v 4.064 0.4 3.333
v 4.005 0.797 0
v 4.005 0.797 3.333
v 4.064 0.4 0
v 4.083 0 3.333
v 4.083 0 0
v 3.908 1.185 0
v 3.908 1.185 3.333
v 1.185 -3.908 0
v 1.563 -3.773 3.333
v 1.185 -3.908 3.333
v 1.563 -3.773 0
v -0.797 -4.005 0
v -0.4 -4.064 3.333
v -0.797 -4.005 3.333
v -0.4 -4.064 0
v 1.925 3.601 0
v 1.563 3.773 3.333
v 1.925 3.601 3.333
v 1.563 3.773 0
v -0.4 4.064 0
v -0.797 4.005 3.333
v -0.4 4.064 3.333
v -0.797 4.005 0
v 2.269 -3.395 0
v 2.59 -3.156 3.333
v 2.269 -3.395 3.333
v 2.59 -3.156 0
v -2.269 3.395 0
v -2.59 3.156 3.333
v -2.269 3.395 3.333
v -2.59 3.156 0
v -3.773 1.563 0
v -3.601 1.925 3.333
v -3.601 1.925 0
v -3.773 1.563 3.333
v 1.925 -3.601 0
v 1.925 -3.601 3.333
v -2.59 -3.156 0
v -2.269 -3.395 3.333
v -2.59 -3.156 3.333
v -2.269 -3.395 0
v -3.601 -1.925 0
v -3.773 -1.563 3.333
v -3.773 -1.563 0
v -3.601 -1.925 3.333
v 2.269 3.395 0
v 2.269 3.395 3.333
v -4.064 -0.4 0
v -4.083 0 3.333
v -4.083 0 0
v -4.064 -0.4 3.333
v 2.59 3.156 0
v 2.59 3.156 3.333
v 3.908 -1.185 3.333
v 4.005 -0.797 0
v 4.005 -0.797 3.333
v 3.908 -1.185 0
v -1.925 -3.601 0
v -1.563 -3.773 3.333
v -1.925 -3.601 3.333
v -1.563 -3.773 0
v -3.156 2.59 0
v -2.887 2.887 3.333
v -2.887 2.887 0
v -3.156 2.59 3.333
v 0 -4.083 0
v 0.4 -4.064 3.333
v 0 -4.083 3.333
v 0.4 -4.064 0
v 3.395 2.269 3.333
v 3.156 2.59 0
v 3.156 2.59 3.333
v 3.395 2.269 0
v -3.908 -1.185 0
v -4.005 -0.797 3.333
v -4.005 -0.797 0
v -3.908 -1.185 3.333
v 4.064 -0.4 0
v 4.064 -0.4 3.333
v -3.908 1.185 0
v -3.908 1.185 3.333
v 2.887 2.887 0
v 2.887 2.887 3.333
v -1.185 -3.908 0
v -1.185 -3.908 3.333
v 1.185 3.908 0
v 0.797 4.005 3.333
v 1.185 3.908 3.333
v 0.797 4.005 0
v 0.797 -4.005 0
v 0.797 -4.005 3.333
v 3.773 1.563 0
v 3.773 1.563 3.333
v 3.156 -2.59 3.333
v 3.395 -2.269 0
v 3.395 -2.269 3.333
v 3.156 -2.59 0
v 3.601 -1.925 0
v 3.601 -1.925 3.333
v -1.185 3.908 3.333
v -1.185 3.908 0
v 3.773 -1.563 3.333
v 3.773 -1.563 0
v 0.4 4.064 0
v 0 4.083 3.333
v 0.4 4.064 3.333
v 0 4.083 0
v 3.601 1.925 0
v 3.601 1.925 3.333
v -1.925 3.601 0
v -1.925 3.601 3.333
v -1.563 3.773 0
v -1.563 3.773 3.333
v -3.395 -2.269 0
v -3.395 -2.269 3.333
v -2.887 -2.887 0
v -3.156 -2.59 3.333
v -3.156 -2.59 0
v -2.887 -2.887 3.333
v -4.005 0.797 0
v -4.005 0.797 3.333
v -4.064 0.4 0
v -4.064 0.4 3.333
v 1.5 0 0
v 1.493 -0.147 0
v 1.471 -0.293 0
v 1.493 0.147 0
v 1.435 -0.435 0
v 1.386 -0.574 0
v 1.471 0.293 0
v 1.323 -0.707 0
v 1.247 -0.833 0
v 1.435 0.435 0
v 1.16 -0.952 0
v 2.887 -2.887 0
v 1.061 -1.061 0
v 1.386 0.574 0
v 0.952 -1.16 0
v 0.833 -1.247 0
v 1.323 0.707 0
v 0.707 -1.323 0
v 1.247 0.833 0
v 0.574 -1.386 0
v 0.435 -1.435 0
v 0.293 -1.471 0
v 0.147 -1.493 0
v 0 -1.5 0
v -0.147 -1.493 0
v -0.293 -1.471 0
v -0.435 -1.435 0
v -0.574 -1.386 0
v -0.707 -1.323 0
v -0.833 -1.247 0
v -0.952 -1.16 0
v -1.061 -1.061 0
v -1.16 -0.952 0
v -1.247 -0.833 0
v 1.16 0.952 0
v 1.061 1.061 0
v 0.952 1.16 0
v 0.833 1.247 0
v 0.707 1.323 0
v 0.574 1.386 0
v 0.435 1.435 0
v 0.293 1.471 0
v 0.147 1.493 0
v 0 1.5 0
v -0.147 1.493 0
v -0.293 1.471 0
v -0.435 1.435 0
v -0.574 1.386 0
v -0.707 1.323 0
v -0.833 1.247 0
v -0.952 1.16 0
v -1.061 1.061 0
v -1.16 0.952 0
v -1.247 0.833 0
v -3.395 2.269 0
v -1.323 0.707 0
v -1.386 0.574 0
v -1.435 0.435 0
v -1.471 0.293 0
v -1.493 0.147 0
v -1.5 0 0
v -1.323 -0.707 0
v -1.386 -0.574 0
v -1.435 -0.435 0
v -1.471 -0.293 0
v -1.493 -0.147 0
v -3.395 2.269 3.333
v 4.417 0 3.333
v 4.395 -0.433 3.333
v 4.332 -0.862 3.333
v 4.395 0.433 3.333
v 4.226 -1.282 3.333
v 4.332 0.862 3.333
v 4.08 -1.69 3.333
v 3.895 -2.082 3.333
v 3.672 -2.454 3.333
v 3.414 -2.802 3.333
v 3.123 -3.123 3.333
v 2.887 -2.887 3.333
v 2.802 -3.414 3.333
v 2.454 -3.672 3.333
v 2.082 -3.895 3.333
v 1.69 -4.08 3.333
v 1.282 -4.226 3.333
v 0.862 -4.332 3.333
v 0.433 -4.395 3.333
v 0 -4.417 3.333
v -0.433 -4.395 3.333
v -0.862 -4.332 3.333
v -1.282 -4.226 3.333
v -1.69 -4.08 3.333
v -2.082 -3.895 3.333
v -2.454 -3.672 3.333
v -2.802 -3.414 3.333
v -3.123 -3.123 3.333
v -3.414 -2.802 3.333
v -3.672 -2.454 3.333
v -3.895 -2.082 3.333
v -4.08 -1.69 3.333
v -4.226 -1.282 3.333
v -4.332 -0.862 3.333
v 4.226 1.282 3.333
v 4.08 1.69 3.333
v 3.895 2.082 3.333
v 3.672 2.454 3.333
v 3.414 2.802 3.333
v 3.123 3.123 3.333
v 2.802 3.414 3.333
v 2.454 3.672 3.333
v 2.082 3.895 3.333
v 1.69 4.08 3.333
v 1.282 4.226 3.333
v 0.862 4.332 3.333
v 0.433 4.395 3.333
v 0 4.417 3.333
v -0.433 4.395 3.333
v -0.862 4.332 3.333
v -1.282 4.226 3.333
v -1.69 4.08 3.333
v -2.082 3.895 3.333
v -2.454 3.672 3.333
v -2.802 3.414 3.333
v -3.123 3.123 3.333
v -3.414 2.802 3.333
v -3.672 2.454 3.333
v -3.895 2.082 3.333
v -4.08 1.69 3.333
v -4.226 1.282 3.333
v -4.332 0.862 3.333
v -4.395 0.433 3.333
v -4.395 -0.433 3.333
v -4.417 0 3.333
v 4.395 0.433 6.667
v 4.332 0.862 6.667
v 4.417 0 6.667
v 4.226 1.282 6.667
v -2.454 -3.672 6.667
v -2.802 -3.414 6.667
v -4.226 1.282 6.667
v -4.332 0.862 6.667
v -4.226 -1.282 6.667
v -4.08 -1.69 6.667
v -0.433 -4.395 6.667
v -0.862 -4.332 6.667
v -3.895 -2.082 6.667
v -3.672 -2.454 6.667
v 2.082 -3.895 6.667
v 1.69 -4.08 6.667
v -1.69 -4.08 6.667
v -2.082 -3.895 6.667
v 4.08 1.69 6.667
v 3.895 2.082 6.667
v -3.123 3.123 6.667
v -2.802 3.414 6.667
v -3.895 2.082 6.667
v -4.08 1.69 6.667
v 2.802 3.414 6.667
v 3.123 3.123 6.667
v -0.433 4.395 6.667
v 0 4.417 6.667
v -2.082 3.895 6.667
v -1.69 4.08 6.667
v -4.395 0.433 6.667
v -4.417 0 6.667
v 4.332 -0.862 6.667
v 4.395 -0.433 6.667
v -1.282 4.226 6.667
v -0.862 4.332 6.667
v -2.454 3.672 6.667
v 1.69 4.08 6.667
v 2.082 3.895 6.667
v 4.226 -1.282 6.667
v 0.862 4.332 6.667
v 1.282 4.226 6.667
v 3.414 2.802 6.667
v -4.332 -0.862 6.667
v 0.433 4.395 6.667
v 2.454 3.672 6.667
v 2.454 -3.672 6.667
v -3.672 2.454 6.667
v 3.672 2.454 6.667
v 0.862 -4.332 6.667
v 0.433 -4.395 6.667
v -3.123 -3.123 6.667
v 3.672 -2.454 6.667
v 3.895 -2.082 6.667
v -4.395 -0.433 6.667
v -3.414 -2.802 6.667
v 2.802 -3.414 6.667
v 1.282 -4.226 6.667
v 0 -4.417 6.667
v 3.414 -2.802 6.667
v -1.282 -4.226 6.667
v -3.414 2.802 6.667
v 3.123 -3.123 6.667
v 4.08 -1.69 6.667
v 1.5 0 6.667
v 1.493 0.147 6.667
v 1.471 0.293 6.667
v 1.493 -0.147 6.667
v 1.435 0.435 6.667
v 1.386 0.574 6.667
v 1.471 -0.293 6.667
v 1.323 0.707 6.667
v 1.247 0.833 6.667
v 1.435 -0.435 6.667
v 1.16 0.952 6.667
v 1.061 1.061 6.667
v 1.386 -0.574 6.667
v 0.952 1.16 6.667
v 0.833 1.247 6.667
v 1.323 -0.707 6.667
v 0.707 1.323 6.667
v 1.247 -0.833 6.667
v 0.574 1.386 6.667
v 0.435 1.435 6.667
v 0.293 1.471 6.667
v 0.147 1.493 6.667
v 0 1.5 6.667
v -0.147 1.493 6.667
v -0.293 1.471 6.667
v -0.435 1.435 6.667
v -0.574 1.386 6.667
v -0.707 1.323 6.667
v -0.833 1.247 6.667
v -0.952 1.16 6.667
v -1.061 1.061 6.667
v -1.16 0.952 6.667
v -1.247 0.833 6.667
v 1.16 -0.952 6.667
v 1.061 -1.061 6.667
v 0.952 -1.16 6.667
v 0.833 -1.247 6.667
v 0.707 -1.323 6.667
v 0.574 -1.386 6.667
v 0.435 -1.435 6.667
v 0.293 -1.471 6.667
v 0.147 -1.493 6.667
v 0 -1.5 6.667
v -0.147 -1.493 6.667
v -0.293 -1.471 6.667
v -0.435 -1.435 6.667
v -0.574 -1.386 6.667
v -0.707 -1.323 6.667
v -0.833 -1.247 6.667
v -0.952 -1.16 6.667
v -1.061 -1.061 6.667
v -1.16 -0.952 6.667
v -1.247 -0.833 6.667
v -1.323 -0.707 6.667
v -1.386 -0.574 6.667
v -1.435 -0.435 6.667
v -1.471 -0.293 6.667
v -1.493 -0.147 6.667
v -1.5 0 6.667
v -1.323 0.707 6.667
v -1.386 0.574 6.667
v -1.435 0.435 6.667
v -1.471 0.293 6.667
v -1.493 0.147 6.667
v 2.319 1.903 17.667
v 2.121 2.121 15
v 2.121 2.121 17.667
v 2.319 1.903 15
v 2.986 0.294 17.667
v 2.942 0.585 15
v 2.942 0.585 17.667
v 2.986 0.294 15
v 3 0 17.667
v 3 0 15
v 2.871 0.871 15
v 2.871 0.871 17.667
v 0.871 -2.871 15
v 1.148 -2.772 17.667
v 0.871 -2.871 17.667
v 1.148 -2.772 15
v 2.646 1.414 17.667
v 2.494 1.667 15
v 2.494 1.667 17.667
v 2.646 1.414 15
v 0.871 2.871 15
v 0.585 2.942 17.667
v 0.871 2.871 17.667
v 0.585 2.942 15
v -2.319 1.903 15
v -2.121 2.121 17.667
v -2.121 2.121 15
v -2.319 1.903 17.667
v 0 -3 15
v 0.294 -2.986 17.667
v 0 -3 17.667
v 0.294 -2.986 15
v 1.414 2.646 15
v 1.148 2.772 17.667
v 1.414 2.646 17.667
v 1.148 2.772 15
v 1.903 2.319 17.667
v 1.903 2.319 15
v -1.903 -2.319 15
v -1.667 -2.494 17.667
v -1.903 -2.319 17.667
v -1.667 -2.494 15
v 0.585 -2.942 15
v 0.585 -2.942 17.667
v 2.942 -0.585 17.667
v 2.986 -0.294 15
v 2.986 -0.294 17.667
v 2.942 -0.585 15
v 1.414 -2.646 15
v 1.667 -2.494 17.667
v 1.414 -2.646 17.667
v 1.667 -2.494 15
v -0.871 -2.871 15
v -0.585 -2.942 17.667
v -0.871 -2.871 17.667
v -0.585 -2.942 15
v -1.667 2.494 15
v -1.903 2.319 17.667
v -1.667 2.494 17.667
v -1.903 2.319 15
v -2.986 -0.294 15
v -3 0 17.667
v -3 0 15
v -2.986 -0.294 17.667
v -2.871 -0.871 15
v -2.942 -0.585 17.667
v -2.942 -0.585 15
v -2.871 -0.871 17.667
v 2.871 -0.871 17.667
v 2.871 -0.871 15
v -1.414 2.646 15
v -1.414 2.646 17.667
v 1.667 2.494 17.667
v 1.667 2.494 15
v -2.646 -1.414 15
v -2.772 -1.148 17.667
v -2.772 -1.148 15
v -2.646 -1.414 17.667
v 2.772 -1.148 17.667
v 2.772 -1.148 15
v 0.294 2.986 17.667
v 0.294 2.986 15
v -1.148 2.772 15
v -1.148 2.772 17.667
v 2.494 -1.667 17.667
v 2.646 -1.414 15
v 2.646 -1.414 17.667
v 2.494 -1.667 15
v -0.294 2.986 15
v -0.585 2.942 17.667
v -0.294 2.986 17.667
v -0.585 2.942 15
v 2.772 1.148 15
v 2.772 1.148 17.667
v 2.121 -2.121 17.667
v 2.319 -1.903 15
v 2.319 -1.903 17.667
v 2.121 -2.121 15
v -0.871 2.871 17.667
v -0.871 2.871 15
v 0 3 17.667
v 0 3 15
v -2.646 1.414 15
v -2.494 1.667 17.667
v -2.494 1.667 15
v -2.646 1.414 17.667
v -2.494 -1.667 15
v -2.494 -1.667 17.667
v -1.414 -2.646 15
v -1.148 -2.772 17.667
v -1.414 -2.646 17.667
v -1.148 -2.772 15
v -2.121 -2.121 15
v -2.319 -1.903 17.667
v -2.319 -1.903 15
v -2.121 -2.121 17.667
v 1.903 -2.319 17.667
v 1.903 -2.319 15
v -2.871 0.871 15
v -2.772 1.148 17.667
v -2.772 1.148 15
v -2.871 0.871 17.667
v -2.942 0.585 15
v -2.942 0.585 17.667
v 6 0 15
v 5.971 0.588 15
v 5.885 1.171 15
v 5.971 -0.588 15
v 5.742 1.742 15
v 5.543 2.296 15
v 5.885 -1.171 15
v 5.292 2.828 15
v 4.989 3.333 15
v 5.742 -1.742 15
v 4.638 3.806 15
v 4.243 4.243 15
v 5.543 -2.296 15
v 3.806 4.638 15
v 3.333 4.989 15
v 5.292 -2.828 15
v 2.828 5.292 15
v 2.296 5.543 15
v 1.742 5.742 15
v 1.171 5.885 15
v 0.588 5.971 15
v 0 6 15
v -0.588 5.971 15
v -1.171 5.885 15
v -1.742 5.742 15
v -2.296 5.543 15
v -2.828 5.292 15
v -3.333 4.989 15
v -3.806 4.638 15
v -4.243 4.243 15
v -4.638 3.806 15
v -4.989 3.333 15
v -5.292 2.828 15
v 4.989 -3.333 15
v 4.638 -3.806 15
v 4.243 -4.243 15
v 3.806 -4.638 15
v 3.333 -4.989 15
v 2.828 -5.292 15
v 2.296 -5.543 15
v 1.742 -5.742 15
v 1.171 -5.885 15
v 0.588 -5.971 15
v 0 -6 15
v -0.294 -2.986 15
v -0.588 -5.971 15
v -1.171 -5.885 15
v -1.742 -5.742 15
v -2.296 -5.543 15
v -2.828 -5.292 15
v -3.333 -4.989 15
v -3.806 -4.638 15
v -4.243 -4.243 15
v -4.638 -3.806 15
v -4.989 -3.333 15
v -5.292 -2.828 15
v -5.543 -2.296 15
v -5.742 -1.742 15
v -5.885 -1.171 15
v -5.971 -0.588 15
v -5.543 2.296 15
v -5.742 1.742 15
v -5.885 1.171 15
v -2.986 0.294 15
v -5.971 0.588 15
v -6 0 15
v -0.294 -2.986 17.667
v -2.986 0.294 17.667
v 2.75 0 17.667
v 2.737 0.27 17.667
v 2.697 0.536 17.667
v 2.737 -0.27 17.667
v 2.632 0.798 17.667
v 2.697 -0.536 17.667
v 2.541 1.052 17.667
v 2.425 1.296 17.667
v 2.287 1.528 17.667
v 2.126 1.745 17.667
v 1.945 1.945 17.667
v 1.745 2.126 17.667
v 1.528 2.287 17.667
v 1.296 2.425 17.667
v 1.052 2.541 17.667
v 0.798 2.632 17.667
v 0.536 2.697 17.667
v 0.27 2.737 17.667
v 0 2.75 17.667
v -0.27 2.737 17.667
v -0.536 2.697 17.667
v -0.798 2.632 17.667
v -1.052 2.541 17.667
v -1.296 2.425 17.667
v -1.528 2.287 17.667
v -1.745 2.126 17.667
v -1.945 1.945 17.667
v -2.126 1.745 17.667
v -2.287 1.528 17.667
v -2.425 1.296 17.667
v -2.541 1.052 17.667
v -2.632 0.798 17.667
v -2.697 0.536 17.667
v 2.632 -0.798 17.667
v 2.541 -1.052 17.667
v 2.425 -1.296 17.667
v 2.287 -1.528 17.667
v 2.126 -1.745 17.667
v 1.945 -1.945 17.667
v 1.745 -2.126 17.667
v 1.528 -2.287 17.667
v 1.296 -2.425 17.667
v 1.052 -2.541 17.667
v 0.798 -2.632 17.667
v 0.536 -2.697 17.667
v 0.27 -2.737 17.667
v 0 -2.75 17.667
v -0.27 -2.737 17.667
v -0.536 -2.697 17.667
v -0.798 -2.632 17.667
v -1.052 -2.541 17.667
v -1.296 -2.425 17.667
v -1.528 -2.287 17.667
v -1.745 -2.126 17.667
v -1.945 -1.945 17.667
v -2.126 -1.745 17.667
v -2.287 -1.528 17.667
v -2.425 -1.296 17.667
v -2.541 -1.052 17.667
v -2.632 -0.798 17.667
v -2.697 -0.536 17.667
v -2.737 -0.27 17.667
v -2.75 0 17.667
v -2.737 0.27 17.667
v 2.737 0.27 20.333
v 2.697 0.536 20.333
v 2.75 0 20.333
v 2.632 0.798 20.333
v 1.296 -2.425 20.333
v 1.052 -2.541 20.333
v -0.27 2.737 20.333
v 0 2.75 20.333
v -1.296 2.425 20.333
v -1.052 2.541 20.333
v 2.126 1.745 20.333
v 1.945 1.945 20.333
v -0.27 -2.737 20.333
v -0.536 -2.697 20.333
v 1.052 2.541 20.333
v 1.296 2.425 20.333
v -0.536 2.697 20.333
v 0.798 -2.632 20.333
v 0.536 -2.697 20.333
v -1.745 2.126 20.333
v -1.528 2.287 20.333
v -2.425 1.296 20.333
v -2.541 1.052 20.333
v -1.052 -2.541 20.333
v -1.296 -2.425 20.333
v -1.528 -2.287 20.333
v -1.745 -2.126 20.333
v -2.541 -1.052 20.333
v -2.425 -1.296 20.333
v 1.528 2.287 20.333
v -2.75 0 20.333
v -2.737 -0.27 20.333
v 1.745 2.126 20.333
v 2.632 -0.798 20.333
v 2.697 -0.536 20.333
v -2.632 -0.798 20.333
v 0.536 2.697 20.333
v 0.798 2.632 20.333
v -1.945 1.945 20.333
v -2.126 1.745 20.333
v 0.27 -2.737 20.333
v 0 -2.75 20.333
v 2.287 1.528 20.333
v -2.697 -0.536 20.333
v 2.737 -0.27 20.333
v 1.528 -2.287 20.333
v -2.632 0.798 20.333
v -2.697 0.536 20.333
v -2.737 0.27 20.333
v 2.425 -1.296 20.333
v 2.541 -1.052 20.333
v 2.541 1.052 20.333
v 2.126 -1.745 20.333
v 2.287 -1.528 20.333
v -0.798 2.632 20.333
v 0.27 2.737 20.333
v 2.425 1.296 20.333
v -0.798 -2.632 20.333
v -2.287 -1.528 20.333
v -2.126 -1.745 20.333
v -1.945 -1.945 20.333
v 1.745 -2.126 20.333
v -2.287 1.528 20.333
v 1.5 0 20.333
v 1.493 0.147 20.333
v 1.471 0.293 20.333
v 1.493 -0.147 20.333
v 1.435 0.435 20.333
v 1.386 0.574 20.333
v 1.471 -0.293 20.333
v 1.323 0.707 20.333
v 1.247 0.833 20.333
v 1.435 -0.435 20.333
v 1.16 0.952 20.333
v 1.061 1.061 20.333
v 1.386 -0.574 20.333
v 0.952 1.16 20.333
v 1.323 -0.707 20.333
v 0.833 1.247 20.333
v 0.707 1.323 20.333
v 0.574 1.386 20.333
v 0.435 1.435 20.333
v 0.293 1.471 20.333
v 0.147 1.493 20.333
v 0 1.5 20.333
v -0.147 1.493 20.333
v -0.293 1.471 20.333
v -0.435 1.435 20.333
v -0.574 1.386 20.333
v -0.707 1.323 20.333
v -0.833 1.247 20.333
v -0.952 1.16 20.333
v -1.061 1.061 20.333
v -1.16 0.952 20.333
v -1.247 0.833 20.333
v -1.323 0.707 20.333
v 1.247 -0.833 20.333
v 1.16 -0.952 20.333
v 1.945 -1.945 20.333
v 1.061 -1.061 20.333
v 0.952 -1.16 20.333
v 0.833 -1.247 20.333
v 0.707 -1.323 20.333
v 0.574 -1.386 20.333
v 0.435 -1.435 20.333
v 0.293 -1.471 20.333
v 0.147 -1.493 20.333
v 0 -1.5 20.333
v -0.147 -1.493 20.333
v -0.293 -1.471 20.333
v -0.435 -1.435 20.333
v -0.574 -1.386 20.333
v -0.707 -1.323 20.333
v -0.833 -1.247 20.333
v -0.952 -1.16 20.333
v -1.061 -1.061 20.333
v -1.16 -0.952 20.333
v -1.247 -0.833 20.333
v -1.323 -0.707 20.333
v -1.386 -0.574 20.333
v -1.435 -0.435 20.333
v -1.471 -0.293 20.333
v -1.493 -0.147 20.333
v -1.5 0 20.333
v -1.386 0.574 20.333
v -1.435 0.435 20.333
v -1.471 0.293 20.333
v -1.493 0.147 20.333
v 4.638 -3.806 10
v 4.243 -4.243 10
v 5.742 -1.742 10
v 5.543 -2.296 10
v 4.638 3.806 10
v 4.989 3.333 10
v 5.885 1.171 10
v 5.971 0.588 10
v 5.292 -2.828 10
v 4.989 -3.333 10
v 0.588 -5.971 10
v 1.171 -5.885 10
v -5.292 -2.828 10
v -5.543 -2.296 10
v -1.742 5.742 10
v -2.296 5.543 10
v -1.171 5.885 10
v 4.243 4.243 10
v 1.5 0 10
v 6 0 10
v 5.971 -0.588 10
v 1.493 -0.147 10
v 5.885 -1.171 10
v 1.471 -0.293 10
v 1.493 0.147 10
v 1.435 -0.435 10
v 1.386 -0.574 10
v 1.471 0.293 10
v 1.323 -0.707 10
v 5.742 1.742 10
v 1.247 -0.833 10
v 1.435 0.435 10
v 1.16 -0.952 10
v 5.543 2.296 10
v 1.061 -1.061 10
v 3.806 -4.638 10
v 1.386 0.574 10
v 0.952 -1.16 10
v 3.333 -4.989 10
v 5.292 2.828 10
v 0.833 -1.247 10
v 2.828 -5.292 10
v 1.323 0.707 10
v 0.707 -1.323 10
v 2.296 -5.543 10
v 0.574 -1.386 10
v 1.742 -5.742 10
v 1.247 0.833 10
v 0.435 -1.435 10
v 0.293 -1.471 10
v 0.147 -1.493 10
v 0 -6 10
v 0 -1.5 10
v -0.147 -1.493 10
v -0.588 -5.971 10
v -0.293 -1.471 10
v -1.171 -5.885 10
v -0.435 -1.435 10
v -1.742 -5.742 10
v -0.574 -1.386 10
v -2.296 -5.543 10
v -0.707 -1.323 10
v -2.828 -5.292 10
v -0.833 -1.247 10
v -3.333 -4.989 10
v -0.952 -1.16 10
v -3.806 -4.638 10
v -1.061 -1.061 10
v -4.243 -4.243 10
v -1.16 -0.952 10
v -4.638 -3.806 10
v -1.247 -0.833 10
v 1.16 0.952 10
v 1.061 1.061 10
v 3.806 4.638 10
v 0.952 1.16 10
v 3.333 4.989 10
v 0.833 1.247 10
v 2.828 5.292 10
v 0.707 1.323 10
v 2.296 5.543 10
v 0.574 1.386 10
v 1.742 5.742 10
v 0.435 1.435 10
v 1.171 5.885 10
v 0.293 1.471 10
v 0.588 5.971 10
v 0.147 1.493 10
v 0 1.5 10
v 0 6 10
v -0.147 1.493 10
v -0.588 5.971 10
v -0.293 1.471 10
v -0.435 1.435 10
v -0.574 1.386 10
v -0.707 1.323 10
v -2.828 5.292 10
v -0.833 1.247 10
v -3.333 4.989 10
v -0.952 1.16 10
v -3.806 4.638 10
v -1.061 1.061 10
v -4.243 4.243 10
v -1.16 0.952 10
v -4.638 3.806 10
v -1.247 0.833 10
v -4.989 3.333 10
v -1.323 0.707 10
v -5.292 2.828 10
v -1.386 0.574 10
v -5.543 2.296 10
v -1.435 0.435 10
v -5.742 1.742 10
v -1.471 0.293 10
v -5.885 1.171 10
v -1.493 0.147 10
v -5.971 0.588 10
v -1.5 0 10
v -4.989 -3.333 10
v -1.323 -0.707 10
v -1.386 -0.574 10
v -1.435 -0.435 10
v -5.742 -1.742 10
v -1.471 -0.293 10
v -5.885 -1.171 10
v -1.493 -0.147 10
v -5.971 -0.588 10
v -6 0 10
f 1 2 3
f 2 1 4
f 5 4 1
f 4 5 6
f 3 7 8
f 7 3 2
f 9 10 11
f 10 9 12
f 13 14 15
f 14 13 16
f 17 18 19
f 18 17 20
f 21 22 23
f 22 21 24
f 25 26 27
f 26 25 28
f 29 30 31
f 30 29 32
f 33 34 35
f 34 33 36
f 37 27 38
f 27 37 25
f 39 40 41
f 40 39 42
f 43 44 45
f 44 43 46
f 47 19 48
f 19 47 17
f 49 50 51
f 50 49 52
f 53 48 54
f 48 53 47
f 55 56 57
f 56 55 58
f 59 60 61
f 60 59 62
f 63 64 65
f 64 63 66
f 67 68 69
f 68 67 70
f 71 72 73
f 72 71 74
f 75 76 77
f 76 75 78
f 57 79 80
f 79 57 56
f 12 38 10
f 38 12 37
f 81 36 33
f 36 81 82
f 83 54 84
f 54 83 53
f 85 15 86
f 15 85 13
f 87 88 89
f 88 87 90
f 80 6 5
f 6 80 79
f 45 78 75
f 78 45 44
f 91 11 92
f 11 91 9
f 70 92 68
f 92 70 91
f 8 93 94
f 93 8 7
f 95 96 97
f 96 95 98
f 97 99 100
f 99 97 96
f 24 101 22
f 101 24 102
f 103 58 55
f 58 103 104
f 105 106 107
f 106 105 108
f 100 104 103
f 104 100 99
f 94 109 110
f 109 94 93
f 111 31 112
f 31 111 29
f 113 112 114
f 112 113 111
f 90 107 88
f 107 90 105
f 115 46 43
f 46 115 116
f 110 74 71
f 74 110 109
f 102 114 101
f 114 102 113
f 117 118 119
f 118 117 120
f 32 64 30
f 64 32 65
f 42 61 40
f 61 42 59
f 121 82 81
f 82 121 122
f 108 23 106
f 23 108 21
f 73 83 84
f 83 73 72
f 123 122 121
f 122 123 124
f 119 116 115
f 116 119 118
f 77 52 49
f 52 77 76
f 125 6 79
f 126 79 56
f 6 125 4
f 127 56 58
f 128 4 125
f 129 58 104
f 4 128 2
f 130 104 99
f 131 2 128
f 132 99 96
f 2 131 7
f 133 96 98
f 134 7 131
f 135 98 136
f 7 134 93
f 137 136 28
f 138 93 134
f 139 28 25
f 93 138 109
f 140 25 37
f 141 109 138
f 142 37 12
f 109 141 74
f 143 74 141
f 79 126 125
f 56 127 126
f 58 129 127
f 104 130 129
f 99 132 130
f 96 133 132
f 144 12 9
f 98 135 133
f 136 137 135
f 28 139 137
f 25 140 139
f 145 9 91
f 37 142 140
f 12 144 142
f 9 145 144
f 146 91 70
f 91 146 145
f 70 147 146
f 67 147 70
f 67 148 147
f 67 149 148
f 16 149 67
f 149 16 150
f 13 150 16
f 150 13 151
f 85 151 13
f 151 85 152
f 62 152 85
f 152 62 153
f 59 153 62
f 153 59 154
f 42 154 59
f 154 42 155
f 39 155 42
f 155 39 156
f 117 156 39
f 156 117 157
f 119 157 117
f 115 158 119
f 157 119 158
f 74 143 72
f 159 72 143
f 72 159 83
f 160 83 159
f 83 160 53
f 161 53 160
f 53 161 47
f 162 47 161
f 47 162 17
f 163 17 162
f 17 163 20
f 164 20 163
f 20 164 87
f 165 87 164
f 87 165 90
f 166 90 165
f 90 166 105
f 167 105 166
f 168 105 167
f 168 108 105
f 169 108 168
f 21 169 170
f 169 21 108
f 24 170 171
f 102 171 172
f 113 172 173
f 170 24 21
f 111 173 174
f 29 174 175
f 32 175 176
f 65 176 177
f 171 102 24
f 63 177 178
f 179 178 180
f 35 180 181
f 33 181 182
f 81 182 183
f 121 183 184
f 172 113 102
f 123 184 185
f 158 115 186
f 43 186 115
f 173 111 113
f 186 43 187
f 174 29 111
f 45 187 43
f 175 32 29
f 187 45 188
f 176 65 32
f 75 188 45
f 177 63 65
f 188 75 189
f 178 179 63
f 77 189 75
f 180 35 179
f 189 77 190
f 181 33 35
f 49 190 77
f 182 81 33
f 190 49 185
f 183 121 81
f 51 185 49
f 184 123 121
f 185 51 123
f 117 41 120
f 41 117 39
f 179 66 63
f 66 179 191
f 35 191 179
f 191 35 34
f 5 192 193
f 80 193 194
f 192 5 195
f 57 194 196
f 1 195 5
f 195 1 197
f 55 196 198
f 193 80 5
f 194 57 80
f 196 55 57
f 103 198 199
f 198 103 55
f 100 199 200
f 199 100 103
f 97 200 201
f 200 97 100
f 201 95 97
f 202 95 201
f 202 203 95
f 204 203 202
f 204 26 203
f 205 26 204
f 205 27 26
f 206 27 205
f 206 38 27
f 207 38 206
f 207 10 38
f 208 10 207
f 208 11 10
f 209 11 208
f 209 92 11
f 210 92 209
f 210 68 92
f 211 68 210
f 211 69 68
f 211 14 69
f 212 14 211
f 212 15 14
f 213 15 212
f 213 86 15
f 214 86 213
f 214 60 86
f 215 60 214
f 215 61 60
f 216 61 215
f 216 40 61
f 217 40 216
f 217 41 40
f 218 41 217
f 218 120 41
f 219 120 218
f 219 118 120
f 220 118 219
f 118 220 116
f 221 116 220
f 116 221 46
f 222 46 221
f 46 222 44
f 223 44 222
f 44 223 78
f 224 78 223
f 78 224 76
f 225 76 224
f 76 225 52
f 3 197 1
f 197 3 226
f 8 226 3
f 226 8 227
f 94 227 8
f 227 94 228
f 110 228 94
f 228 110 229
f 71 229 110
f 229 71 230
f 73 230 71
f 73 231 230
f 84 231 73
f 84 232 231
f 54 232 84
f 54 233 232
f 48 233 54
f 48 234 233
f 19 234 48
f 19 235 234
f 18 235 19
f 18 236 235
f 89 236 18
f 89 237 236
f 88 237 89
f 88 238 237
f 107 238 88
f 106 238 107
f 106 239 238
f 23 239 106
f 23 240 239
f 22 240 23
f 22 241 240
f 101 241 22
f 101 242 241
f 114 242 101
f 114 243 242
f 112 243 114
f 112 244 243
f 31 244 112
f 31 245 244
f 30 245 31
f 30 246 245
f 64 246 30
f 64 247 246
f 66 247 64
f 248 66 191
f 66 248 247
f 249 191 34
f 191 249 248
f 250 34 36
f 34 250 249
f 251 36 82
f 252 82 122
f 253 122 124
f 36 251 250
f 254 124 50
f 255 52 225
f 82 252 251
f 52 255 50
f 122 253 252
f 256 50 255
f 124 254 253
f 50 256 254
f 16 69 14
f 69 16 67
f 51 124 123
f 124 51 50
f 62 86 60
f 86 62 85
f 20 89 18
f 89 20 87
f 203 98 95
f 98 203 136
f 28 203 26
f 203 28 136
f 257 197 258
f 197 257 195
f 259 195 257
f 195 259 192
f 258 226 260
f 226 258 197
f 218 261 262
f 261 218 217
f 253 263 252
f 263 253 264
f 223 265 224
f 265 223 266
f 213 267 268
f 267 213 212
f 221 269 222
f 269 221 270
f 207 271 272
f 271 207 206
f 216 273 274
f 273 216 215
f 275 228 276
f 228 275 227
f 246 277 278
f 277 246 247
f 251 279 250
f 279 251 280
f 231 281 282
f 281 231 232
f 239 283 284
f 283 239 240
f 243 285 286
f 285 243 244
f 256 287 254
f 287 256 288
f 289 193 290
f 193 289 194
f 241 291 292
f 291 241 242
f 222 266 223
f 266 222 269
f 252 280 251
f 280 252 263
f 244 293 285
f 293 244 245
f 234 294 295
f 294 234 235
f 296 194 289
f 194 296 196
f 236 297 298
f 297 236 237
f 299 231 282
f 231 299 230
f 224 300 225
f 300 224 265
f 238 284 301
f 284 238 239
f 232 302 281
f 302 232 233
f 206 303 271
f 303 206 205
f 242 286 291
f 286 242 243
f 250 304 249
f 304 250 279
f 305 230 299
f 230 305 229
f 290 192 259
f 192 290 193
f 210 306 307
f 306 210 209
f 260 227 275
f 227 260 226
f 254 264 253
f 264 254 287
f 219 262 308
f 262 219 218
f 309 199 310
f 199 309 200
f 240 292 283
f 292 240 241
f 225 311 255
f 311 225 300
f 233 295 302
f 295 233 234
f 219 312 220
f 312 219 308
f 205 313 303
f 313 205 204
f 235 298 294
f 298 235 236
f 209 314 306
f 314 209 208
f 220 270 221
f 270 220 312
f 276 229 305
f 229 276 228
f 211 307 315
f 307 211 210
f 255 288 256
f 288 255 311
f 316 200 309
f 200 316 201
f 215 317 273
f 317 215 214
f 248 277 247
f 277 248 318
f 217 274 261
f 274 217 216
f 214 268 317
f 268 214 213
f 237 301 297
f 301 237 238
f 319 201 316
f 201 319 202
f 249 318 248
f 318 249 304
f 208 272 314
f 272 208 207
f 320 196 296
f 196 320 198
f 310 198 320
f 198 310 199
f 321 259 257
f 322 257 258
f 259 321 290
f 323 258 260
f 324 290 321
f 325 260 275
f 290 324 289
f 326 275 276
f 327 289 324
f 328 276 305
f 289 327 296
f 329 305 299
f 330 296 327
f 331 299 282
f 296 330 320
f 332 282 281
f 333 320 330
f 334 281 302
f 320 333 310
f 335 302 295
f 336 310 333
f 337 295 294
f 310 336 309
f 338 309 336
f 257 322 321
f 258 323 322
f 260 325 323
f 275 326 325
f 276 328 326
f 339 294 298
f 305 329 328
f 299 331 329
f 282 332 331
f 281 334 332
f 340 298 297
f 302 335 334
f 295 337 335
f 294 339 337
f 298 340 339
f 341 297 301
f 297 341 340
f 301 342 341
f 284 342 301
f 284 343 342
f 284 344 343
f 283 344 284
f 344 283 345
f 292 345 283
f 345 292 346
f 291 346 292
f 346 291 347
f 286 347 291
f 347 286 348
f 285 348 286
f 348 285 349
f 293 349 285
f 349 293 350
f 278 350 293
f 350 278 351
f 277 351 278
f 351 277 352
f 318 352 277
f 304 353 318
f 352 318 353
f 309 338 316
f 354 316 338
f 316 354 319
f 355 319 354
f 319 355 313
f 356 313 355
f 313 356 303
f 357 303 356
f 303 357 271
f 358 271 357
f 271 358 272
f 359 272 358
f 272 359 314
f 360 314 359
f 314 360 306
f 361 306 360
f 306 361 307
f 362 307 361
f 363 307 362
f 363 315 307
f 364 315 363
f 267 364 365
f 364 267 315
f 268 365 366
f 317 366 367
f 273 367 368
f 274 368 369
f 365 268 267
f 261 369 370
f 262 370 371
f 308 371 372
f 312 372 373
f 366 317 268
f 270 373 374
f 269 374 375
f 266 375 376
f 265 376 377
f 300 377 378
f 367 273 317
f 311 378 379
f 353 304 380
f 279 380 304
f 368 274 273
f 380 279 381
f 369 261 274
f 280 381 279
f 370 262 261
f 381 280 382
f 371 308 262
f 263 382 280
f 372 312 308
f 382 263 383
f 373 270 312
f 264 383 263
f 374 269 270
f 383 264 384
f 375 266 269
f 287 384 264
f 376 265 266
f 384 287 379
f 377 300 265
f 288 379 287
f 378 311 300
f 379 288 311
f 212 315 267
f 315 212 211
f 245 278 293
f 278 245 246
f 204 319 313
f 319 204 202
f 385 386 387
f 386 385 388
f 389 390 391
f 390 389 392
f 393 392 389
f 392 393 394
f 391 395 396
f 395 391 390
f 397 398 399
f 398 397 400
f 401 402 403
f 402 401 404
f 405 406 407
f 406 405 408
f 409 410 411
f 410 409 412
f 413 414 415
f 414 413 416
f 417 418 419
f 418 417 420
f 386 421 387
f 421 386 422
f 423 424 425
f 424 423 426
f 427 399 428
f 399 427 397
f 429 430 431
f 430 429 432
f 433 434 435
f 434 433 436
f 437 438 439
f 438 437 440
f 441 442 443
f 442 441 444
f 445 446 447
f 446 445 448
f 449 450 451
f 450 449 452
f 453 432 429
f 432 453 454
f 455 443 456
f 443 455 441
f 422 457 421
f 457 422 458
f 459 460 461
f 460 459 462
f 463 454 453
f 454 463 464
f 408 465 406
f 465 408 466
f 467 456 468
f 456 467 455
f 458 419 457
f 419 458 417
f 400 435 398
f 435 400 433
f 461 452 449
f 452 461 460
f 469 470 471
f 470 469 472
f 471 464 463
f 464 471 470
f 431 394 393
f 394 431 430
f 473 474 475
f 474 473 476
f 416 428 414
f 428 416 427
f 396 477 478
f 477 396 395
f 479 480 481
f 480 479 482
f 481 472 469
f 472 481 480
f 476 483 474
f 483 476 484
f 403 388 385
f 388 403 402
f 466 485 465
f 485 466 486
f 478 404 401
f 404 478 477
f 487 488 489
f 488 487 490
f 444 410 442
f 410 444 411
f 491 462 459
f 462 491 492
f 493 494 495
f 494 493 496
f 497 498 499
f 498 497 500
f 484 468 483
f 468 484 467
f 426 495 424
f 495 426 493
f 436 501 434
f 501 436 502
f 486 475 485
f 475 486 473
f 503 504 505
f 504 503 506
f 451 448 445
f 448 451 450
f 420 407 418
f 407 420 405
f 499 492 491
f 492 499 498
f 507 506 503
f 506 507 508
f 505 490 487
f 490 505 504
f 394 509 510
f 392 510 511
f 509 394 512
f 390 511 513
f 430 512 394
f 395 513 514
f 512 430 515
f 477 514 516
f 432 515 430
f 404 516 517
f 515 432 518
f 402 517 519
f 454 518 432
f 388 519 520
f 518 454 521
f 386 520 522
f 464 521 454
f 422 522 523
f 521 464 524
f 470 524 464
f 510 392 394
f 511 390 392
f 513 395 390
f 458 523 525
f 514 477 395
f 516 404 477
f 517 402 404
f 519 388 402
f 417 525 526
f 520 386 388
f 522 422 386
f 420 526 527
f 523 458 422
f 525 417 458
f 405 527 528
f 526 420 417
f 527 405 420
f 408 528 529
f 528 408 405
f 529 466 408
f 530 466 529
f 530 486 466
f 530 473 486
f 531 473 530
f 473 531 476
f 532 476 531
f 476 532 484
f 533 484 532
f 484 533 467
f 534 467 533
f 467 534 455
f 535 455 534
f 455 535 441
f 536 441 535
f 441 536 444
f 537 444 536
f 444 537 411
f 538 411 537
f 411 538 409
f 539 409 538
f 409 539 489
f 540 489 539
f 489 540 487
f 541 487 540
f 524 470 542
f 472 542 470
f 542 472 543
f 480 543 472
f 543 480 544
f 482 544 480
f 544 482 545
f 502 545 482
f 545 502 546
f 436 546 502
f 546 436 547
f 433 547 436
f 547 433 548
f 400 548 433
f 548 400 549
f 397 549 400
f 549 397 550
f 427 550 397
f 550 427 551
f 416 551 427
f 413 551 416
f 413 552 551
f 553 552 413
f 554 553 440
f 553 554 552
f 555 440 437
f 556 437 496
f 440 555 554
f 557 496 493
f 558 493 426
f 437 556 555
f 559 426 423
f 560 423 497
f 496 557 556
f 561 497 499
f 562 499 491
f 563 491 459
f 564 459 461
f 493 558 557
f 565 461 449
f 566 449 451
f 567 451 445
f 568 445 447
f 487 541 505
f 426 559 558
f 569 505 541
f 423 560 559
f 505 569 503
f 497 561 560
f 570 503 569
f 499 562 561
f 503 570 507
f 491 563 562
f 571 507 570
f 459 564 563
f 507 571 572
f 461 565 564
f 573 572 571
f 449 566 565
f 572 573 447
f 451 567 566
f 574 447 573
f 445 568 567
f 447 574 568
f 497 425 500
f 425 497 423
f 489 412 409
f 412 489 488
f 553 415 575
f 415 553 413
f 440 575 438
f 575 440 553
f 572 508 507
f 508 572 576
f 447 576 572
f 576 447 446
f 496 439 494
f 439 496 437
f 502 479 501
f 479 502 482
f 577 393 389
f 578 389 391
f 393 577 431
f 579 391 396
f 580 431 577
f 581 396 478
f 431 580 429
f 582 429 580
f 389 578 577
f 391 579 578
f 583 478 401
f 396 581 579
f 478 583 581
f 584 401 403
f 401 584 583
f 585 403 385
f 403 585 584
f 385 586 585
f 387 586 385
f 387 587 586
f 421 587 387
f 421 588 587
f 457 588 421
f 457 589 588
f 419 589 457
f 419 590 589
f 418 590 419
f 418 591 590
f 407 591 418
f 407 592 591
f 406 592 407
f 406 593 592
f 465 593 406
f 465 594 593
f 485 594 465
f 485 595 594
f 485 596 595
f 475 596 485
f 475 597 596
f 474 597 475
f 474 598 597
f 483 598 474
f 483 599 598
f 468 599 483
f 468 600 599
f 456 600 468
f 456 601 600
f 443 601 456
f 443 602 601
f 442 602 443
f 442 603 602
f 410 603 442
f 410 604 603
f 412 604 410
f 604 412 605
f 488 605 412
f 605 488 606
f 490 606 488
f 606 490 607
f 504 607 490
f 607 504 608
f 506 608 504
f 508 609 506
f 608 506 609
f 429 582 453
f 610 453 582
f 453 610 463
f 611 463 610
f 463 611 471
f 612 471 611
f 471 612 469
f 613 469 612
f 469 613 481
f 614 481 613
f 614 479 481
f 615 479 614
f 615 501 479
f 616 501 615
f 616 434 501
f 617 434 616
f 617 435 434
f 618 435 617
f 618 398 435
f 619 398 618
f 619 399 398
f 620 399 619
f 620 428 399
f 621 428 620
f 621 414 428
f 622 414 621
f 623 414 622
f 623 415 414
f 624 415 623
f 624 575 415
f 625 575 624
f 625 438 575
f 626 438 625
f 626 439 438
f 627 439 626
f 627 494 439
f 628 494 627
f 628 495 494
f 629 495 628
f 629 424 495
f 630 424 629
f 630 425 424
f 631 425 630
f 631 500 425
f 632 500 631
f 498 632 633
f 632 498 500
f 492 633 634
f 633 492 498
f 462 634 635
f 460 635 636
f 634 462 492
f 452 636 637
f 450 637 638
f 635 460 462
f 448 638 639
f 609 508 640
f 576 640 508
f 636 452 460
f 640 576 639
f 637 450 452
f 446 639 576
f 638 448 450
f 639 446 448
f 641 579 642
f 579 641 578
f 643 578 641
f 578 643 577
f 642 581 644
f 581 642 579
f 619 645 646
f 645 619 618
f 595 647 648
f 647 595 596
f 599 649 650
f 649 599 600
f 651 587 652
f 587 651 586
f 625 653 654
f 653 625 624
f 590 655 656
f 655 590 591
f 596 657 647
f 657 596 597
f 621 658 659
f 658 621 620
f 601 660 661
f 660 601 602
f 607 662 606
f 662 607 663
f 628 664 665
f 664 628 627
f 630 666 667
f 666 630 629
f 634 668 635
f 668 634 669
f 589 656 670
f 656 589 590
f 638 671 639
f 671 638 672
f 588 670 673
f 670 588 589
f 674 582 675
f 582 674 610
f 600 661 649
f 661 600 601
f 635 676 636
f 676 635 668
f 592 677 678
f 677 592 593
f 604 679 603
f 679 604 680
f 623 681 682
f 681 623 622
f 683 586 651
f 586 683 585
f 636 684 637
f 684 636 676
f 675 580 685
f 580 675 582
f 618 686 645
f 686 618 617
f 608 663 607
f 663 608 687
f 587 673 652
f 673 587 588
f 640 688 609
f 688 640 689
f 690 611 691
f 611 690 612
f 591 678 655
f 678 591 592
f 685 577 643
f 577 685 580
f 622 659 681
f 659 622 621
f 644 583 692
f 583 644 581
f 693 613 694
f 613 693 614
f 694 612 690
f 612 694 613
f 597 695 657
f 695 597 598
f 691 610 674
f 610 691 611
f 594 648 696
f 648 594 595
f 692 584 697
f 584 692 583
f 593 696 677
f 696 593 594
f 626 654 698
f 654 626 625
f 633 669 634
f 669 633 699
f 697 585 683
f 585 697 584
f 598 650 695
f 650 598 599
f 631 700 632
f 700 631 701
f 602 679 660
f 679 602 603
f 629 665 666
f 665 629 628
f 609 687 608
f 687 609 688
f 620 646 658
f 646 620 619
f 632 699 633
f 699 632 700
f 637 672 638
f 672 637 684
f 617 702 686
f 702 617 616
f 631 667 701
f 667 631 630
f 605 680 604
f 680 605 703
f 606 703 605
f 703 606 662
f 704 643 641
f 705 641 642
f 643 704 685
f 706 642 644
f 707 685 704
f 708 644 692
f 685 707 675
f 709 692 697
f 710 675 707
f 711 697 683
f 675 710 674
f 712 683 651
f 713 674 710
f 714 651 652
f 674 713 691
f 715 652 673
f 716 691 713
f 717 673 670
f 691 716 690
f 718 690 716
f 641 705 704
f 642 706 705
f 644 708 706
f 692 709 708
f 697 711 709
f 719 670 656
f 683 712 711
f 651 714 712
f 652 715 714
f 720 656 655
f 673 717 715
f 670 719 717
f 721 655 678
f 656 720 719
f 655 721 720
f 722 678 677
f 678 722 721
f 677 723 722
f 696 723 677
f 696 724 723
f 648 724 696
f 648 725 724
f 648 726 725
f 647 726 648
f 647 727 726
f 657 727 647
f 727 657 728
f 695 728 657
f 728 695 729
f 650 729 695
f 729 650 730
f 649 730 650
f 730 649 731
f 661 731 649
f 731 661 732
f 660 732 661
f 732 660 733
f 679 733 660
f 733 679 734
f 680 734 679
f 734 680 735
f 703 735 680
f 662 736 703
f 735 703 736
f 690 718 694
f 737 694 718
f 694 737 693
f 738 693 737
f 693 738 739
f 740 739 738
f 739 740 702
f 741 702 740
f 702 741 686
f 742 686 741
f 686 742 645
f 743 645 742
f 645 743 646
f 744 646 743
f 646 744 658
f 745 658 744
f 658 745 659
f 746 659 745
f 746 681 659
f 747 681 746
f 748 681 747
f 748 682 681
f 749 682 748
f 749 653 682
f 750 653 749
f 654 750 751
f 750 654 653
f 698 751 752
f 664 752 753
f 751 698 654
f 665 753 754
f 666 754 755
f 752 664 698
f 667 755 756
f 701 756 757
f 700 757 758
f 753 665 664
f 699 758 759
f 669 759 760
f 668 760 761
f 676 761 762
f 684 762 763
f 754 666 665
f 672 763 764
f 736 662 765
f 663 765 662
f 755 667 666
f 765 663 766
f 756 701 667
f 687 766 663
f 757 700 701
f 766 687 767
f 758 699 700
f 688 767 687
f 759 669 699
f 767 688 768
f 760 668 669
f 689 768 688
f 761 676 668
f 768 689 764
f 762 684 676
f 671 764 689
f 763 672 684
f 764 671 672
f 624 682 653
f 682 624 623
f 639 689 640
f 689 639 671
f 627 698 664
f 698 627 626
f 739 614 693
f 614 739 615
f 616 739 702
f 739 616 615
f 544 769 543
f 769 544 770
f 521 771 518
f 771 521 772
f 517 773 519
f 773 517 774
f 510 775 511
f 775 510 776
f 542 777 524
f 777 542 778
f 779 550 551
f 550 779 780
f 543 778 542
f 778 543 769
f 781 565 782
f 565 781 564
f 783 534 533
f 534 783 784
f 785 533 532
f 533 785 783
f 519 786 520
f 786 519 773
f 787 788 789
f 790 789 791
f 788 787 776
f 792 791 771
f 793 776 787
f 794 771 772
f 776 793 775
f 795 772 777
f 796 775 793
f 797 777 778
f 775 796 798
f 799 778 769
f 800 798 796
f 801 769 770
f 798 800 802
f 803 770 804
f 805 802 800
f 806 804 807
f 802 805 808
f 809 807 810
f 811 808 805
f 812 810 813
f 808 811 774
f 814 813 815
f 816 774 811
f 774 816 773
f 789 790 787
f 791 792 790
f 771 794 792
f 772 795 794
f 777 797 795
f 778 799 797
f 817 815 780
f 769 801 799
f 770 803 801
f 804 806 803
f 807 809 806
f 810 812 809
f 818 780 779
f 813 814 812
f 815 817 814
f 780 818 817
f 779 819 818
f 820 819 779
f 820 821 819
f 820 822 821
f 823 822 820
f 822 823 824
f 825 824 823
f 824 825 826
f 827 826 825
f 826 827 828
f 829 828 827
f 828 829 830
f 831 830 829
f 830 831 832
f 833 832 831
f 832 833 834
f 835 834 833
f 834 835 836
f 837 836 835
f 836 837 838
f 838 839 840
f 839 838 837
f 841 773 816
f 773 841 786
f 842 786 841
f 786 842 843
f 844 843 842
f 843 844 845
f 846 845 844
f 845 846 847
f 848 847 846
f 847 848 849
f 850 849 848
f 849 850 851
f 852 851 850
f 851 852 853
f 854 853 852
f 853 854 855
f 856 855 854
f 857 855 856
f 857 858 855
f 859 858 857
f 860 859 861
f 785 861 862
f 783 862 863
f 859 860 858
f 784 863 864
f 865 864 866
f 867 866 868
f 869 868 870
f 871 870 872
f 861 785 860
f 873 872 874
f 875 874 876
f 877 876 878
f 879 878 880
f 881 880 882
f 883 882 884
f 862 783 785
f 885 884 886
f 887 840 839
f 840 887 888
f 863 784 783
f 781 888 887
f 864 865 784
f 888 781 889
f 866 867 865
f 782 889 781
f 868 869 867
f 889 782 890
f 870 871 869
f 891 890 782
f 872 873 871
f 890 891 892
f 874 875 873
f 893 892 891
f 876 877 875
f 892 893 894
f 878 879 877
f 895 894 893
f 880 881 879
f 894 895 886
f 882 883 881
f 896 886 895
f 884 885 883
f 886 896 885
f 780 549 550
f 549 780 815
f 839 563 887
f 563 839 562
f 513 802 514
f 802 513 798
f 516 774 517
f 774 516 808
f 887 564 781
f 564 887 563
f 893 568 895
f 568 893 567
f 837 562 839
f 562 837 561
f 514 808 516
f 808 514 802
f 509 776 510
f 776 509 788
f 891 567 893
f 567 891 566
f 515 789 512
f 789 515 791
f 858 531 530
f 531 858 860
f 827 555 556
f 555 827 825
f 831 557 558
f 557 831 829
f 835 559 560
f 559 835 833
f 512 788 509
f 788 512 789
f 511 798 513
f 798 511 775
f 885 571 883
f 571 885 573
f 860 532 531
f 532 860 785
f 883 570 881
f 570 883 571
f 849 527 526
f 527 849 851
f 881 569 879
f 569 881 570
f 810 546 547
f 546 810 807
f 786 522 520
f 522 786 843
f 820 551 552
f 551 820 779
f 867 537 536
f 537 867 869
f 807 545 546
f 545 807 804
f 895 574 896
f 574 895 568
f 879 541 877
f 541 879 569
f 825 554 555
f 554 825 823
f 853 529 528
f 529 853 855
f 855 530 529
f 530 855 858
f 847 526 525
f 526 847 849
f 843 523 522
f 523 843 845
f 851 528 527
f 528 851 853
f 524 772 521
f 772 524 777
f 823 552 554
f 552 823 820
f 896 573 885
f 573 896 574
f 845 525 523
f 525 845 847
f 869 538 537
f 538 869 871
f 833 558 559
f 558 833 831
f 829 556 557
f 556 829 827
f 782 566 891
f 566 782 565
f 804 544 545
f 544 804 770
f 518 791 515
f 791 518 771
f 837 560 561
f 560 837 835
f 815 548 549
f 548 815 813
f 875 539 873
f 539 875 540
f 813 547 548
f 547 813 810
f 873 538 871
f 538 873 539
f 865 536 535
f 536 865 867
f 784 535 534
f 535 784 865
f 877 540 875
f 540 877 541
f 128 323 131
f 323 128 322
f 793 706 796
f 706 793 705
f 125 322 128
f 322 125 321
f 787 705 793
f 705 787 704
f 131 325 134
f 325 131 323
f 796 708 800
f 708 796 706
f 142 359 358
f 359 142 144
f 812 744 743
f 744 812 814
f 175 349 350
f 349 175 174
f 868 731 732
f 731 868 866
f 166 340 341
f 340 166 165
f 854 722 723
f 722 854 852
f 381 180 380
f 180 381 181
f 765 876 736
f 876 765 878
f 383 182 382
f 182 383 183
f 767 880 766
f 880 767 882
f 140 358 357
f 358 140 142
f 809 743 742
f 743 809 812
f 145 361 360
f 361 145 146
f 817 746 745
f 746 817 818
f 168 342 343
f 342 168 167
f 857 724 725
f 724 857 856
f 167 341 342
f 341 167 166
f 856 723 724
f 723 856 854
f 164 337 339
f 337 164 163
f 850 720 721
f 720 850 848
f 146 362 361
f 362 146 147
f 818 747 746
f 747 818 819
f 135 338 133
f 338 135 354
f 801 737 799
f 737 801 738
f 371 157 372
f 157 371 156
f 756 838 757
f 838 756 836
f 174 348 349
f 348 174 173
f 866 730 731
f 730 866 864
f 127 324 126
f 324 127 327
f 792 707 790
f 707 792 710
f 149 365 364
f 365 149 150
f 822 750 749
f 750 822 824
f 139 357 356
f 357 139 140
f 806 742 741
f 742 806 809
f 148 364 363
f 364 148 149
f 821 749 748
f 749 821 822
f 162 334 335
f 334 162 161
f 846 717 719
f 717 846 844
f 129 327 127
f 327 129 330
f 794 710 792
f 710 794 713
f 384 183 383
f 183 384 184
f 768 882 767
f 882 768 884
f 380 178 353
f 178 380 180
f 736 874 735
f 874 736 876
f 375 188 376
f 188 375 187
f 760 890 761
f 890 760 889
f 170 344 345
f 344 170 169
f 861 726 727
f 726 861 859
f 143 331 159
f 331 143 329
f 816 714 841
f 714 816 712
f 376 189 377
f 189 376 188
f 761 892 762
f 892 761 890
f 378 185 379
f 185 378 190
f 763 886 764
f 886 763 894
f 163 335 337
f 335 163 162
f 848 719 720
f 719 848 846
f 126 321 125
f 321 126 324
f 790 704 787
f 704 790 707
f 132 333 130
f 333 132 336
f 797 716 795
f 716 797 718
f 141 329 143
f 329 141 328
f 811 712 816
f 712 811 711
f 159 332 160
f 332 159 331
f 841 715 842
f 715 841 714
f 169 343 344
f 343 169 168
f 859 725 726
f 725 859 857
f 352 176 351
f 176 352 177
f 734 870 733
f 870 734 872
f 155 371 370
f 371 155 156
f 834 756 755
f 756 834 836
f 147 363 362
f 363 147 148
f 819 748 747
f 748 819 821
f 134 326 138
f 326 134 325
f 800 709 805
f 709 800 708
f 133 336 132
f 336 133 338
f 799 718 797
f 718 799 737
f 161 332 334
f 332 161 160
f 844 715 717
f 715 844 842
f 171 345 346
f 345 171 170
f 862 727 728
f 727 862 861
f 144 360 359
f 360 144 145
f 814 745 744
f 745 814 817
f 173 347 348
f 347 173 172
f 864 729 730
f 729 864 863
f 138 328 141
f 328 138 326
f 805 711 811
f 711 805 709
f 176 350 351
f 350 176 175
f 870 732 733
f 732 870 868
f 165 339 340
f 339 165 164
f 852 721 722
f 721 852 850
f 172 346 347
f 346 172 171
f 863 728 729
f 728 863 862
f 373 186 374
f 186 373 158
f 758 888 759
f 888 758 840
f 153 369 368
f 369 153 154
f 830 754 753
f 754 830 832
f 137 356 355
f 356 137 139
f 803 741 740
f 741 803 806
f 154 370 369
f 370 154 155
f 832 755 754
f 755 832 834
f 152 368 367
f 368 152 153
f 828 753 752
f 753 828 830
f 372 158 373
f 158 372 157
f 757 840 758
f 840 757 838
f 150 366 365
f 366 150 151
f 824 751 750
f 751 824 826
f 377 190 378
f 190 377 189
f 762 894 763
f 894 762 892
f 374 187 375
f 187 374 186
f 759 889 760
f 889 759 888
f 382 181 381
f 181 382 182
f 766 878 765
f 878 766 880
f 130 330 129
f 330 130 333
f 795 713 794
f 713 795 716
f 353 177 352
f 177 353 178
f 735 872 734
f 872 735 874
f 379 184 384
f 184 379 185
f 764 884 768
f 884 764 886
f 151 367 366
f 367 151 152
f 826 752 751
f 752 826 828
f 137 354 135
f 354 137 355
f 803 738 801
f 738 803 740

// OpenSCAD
// Hose-barb reducer: 8 mm tubing (barbs) -> 5 mm tubing (barbs)
// Print orientation: standing upright along Z

$fn = 64;

// ---- 8 mm tubing barbs ----
barb8_bottom_d = 7.5;    // outer diameter at bottom of barbs
barb8_top_d    = 9.5;    // outer diameter at top of barbs
barb8_count    = 2;      // number of barbs (stacked)
barb8_height   = 10;     // barb height (z = 0 to 10, per barb)

// ---- Collar ----
collar_d       = 12;     // collar diameter
collar_h       = 5;      // collar height (z = 20 to 25)

// ---- 5 mm tubing barbs ----
barb5_bottom_d = 6.5;    // outer diameter at bottom of barbs
barb5_top_d    = 5.0;    // outer diameter at top of barbs
barb5_count    = 2;      // number of barbs (stacked)
barb5_height   = 8;      // barb height (z = 30 to 38, per barb)

// ---- Through bore ----
bore_d         = 3;      // full-length bore diameter

// ---- Derived ----
z0             = 0;      // start of barbs
z8             = barb8_height;  // end of 8 mm barbs
zcollar        = z8 + collar_h;     // end of collar
z5             = zcollar + barb5_height; // end of 5 mm barbs
eps            = 0.5;    // cutter overshoot

total_h        = z5;

difference() {
    union() {
        // 8 mm barbs: sawtooth profile, stacked
        for (i = [0 : barb8_count - 1]) {
            translate([0, 0, z0 + i * barb8_height / (barb8_count + 1)])
                cylinder(h = barb8_height / (barb8_count + 1),
                         d = barb8_bottom_d + (i + 1) * (barb8_top_d - barb8_bottom_d) / (barb8_count + 1));
        }

        // Collar
        translate([0, 0, z8])
            cylinder(h = collar_h, d = collar_d);

        // 5 mm barbs: tapered profile, stacked
        for (i = [0 : barb5_count - 1]) {
            translate([0, 0, zcollar + i * barb5_height / (barb5_count + 1)])
                cylinder(h = barb5_height / (barb5_count + 1),
                         d = barb5_bottom_d + (i + 1) * (barb5_top_d - barb5_bottom_d) / (barb5_count + 1));
        }
    }

    // Full-length bore
    translate([0, 0, -eps])
        cylinder(h = total_h + 2 * eps, d = bore_d);
}
